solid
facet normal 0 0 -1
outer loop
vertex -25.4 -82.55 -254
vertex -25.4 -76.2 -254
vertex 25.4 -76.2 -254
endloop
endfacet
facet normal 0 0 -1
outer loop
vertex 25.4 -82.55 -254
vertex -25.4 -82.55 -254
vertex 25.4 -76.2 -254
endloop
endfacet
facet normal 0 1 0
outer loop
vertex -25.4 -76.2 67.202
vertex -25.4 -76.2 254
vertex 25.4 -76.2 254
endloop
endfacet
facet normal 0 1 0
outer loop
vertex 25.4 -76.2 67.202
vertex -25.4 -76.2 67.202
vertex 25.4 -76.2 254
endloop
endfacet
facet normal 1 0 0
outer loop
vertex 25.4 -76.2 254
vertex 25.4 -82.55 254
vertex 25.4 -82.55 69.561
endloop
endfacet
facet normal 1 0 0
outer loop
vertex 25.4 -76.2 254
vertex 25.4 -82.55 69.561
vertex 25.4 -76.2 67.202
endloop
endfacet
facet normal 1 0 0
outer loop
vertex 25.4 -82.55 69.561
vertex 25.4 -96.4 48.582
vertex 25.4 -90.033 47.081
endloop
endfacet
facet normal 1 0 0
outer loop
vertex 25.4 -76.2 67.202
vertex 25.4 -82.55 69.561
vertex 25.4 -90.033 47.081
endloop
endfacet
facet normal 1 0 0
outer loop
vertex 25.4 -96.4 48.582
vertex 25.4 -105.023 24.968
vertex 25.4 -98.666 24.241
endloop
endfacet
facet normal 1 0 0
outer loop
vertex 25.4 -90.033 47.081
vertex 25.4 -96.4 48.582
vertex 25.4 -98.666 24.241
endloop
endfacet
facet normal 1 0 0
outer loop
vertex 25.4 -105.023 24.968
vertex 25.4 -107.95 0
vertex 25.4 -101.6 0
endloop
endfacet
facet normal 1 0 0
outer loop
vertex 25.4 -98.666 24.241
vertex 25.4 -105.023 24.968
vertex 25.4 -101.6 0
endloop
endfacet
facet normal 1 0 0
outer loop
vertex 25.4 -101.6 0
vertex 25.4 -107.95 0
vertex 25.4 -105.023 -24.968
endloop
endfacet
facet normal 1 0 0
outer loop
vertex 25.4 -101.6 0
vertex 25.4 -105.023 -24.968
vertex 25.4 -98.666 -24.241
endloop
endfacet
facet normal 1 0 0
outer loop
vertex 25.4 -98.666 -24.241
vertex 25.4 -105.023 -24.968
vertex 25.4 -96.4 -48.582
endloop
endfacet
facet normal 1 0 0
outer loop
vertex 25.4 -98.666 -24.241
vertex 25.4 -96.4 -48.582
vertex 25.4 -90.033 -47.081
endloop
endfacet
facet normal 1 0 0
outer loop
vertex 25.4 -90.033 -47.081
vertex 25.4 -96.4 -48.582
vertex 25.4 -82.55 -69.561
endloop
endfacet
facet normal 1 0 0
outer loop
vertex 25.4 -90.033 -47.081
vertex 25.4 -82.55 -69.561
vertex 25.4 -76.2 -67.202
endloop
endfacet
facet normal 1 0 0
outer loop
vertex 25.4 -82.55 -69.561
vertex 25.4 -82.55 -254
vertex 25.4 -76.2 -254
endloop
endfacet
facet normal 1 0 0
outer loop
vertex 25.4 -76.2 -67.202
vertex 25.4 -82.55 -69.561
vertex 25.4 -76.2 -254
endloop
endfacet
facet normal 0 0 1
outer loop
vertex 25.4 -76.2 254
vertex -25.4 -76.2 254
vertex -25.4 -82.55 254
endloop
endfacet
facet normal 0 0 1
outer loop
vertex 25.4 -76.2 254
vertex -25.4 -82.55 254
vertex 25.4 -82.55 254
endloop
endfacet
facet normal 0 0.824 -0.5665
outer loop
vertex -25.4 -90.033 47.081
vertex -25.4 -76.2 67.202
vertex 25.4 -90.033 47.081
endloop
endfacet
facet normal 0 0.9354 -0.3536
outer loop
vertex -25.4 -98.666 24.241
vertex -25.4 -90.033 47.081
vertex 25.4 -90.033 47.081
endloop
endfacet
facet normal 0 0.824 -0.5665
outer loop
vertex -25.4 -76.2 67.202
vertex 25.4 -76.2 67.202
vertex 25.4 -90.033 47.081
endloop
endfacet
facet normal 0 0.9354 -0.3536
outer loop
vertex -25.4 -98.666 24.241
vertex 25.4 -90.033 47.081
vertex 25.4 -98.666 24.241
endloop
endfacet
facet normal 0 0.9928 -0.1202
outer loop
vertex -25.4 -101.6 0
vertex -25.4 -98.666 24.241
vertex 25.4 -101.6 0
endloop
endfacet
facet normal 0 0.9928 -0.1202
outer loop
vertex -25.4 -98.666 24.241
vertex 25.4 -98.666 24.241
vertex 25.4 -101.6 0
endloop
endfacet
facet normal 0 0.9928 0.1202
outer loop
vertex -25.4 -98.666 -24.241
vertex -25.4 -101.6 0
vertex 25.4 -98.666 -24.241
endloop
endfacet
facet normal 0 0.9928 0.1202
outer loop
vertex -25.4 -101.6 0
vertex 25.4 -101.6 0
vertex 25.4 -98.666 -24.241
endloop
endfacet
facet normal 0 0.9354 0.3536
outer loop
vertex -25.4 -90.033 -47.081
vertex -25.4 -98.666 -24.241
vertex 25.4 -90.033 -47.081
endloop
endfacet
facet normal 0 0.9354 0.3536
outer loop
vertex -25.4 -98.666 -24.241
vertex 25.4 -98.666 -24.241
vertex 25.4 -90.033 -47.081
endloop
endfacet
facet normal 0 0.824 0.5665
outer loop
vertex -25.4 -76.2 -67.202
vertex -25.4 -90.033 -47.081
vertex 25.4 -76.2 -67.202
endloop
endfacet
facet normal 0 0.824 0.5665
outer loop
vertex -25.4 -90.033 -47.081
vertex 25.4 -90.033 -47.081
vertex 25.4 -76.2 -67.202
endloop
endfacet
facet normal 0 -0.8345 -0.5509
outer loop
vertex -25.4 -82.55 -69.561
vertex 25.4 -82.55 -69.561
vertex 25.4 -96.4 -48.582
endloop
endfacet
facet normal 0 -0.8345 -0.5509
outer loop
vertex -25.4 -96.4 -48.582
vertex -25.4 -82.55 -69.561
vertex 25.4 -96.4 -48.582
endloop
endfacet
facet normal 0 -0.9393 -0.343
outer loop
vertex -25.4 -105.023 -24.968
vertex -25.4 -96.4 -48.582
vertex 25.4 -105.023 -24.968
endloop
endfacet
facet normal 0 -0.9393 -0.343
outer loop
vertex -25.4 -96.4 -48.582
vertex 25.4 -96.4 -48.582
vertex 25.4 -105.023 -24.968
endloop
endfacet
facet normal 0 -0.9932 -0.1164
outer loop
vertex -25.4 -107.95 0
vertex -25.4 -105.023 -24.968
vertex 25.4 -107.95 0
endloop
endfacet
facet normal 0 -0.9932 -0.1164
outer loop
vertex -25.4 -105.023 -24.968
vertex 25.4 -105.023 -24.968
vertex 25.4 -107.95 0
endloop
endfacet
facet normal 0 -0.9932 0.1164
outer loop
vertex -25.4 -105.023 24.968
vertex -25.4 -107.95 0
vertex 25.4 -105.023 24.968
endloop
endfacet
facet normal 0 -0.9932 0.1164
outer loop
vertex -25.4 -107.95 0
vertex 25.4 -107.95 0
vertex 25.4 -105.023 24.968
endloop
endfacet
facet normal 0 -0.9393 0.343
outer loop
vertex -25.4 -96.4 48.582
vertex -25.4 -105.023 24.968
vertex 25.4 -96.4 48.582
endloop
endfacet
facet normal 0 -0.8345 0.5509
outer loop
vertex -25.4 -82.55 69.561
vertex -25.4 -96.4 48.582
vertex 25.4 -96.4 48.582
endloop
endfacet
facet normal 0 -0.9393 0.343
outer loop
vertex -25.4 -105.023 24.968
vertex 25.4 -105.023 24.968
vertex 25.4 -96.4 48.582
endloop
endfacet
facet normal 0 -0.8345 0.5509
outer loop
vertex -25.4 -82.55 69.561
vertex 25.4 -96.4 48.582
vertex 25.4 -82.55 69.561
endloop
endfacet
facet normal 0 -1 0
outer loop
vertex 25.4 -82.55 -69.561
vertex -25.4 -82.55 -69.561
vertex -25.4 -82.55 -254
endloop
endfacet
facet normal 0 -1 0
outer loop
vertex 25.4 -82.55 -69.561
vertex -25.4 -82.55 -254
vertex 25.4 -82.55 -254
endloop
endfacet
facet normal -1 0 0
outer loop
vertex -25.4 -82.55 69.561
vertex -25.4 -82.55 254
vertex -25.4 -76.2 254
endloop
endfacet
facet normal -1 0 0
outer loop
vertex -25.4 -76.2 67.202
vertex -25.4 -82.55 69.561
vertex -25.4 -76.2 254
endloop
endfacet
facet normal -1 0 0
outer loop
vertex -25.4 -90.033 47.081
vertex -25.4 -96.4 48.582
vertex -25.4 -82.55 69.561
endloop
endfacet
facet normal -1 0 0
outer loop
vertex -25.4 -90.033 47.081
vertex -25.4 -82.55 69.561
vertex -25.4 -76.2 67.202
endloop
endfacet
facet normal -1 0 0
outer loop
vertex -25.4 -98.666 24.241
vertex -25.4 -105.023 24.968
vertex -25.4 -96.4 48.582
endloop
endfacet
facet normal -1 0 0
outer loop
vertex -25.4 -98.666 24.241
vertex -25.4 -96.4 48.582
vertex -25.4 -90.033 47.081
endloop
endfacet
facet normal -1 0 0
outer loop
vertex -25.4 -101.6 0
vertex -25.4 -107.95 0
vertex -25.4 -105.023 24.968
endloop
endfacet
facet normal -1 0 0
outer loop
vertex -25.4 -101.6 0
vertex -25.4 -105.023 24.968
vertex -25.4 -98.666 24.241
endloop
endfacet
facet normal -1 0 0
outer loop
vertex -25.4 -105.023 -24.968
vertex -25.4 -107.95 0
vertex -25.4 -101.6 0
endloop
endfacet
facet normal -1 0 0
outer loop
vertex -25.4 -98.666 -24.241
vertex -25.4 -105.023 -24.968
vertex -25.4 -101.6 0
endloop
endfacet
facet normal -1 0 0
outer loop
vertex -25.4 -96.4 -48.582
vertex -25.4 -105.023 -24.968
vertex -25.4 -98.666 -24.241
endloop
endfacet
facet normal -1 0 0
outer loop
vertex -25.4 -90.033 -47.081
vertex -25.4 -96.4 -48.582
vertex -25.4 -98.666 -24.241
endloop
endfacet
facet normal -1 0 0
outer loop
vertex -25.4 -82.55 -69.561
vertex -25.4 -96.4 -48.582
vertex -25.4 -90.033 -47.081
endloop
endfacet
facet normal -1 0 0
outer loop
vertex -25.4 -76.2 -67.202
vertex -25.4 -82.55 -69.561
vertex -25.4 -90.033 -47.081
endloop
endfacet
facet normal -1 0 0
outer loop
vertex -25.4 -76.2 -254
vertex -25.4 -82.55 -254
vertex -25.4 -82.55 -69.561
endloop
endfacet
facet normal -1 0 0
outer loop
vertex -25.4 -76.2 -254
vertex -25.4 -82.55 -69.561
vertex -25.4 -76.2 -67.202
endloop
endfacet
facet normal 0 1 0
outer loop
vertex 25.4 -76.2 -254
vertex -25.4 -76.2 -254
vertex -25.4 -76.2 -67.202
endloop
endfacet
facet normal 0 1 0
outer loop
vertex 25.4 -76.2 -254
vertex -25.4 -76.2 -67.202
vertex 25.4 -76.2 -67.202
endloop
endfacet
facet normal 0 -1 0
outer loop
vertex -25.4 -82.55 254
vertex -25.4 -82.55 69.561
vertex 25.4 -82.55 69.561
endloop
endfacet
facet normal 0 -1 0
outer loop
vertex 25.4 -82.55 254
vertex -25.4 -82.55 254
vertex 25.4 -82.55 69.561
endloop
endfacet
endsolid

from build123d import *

# Parameters (mm, degrees)
BOSS_EXTRUDE1_DEPTH      = 25.4
BOSS_EXTRUDE2_REACH      = 350.576
BOSS_EXTRUDE2_END_RADIUS = 107.95
SKETCH2_W                = 50.8
SKETCH2_H                = 6.35


with BuildPart() as part:
    # Sketch1 → Boss-Extrude1 (new, symmetric)
    with BuildSketch(Plane(origin=(0, 0, 0), x_dir=(0, 0, -1), z_dir=(1, 0, 0))):
        with BuildLine():
            Line((-76.464125575, -76.2), (-67.202083301, -76.2))
            ThreePointArc((-67.202083301, -76.2), (0, -101.6), (67.202083301, -76.2))
            Line((67.202083301, -76.2), (76.464125575, -76.2))
            ThreePointArc((76.464125575, -76.2), (0, -107.95), (-76.464125575, -76.2))
        make_face()
    extrude(amount=BOSS_EXTRUDE1_DEPTH, both=True)

    # Boss-Extrude2: up to this cylinder (the profile starts outside it)
    boss_extrude2_end = Plane(origin=(0, 0, 0), z_dir=(-1, 0, 0)) * Cylinder(BOSS_EXTRUDE2_END_RADIUS, 918.052, mode=Mode.PRIVATE)
    # Sketch2 → Boss-Extrude2 (add, up to the surface)
    with BuildSketch(Plane.XY.offset(254), mode=Mode.PRIVATE) as boss_extrude2_sk1:
        with Locations((0, -79.375)):
            Rectangle(SKETCH2_W, SKETCH2_H)
    boss_extrude2_tool1 = extrude(boss_extrude2_sk1.sketch, amount=-BOSS_EXTRUDE2_REACH, mode=Mode.PRIVATE) - boss_extrude2_end
    boss_extrude2 = boss_extrude2_tool1.solids().sort_by_distance((0, -79.375, 254))[0]
    add(boss_extrude2)

    # Mirror1: Boss-Extrude2 across plane
    add(boss_extrude2.mirror(Plane.XY))


solid = part.part
